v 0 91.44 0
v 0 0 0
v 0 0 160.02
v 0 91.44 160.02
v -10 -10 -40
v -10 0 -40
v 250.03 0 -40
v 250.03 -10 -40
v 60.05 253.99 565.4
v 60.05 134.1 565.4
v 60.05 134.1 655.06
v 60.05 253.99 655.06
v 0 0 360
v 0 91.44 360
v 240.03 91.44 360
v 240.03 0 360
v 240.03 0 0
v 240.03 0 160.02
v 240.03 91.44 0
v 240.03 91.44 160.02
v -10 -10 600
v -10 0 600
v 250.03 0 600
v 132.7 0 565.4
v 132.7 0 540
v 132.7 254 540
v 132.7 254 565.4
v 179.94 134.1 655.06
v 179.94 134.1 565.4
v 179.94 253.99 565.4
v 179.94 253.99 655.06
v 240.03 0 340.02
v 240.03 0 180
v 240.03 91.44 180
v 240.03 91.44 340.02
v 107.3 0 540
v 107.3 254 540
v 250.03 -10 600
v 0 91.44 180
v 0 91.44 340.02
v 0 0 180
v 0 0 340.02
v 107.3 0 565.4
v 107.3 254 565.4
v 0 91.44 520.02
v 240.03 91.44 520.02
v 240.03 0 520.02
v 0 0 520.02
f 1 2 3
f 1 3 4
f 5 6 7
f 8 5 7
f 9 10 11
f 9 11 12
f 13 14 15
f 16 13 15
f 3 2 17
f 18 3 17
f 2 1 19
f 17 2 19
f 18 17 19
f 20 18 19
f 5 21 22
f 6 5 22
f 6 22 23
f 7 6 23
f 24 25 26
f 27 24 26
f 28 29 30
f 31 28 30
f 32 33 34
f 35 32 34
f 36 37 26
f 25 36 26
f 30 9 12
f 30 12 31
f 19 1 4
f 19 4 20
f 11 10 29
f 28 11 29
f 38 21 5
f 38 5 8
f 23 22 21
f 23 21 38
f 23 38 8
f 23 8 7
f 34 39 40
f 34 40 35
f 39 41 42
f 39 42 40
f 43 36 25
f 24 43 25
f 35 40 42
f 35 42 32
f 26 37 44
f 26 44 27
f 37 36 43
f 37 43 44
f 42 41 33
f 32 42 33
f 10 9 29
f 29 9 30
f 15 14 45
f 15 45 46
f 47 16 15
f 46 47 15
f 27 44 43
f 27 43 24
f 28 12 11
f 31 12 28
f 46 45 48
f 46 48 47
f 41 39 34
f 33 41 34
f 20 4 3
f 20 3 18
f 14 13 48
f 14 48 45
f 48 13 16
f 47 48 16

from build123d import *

# Parameters (mm, degrees)
BOX_W        = 240.03
BOX_H        = 91.44
BOX_DEPTH    = 160.02
BOX001_W     = 240.03
BOX001_H     = 91.44
BOX001_DEPTH = 160.02
BOX002_W     = 240.03
BOX002_H     = 91.44
BOX002_DEPTH = 160.02
BOX003_W     = 119.89
BOX003_H     = 119.89
BOX003_DEPTH = 89.66
BOX005_W     = 25.4
BOX005_H     = 254
BOX005_DEPTH = 25.4
BOX006_W     = 260.03
BOX006_H     = 10
BOX006_DEPTH = 640


with BuildPart() as power_module:
    # Box → Box (new body)
    with BuildSketch(Plane.XY):
        with Locations((120.015, 45.72)):
            Rectangle(BOX_W, BOX_H)
    extrude(amount=BOX_DEPTH)


with BuildPart() as main_module:
    # Box001 → Box001 (new body)
    with BuildSketch(Plane.XY.offset(180)):
        with Locations((120.015, 45.72)):
            Rectangle(BOX001_W, BOX001_H)
    extrude(amount=BOX001_DEPTH)


with BuildPart() as ozone_module:
    # Box002 → Box002 (new body)
    with BuildSketch(Plane.XY.offset(360)):
        with Locations((120.015, 45.72)):
            Rectangle(BOX002_W, BOX002_H)
    extrude(amount=BOX002_DEPTH)


with BuildPart() as light_module:
    # Box003 → Box003 (new body)
    with BuildSketch(Plane(origin=(60.05, 134.1, 565.4), x_dir=(1, 0, 0), z_dir=(0, 0, 1))):
        with Locations((59.945, 59.945)):
            Rectangle(BOX003_W, BOX003_H)
    extrude(amount=BOX003_DEPTH)


with BuildPart() as railing:
    # Box005 → Box005 (new body)
    with BuildSketch(Plane(origin=(107.3, 0, 540), x_dir=(1, 0, 0), z_dir=(0, 0, 1))):
        with Locations((12.7, 127)):
            Rectangle(BOX005_W, BOX005_H)
    extrude(amount=BOX005_DEPTH)


with BuildPart() as backpanel:
    # Box006 → Box006 (new body)
    with BuildSketch(Plane(origin=(-10, -10, -40), x_dir=(1, 0, 0), z_dir=(0, 0, 1))):
        with Locations((130.015, 5)):
            Rectangle(BOX006_W, BOX006_H)
    extrude(amount=BOX006_DEPTH)


solid = Compound([power_module.part, main_module.part, ozone_module.part, light_module.part, railing.part, backpanel.part])
